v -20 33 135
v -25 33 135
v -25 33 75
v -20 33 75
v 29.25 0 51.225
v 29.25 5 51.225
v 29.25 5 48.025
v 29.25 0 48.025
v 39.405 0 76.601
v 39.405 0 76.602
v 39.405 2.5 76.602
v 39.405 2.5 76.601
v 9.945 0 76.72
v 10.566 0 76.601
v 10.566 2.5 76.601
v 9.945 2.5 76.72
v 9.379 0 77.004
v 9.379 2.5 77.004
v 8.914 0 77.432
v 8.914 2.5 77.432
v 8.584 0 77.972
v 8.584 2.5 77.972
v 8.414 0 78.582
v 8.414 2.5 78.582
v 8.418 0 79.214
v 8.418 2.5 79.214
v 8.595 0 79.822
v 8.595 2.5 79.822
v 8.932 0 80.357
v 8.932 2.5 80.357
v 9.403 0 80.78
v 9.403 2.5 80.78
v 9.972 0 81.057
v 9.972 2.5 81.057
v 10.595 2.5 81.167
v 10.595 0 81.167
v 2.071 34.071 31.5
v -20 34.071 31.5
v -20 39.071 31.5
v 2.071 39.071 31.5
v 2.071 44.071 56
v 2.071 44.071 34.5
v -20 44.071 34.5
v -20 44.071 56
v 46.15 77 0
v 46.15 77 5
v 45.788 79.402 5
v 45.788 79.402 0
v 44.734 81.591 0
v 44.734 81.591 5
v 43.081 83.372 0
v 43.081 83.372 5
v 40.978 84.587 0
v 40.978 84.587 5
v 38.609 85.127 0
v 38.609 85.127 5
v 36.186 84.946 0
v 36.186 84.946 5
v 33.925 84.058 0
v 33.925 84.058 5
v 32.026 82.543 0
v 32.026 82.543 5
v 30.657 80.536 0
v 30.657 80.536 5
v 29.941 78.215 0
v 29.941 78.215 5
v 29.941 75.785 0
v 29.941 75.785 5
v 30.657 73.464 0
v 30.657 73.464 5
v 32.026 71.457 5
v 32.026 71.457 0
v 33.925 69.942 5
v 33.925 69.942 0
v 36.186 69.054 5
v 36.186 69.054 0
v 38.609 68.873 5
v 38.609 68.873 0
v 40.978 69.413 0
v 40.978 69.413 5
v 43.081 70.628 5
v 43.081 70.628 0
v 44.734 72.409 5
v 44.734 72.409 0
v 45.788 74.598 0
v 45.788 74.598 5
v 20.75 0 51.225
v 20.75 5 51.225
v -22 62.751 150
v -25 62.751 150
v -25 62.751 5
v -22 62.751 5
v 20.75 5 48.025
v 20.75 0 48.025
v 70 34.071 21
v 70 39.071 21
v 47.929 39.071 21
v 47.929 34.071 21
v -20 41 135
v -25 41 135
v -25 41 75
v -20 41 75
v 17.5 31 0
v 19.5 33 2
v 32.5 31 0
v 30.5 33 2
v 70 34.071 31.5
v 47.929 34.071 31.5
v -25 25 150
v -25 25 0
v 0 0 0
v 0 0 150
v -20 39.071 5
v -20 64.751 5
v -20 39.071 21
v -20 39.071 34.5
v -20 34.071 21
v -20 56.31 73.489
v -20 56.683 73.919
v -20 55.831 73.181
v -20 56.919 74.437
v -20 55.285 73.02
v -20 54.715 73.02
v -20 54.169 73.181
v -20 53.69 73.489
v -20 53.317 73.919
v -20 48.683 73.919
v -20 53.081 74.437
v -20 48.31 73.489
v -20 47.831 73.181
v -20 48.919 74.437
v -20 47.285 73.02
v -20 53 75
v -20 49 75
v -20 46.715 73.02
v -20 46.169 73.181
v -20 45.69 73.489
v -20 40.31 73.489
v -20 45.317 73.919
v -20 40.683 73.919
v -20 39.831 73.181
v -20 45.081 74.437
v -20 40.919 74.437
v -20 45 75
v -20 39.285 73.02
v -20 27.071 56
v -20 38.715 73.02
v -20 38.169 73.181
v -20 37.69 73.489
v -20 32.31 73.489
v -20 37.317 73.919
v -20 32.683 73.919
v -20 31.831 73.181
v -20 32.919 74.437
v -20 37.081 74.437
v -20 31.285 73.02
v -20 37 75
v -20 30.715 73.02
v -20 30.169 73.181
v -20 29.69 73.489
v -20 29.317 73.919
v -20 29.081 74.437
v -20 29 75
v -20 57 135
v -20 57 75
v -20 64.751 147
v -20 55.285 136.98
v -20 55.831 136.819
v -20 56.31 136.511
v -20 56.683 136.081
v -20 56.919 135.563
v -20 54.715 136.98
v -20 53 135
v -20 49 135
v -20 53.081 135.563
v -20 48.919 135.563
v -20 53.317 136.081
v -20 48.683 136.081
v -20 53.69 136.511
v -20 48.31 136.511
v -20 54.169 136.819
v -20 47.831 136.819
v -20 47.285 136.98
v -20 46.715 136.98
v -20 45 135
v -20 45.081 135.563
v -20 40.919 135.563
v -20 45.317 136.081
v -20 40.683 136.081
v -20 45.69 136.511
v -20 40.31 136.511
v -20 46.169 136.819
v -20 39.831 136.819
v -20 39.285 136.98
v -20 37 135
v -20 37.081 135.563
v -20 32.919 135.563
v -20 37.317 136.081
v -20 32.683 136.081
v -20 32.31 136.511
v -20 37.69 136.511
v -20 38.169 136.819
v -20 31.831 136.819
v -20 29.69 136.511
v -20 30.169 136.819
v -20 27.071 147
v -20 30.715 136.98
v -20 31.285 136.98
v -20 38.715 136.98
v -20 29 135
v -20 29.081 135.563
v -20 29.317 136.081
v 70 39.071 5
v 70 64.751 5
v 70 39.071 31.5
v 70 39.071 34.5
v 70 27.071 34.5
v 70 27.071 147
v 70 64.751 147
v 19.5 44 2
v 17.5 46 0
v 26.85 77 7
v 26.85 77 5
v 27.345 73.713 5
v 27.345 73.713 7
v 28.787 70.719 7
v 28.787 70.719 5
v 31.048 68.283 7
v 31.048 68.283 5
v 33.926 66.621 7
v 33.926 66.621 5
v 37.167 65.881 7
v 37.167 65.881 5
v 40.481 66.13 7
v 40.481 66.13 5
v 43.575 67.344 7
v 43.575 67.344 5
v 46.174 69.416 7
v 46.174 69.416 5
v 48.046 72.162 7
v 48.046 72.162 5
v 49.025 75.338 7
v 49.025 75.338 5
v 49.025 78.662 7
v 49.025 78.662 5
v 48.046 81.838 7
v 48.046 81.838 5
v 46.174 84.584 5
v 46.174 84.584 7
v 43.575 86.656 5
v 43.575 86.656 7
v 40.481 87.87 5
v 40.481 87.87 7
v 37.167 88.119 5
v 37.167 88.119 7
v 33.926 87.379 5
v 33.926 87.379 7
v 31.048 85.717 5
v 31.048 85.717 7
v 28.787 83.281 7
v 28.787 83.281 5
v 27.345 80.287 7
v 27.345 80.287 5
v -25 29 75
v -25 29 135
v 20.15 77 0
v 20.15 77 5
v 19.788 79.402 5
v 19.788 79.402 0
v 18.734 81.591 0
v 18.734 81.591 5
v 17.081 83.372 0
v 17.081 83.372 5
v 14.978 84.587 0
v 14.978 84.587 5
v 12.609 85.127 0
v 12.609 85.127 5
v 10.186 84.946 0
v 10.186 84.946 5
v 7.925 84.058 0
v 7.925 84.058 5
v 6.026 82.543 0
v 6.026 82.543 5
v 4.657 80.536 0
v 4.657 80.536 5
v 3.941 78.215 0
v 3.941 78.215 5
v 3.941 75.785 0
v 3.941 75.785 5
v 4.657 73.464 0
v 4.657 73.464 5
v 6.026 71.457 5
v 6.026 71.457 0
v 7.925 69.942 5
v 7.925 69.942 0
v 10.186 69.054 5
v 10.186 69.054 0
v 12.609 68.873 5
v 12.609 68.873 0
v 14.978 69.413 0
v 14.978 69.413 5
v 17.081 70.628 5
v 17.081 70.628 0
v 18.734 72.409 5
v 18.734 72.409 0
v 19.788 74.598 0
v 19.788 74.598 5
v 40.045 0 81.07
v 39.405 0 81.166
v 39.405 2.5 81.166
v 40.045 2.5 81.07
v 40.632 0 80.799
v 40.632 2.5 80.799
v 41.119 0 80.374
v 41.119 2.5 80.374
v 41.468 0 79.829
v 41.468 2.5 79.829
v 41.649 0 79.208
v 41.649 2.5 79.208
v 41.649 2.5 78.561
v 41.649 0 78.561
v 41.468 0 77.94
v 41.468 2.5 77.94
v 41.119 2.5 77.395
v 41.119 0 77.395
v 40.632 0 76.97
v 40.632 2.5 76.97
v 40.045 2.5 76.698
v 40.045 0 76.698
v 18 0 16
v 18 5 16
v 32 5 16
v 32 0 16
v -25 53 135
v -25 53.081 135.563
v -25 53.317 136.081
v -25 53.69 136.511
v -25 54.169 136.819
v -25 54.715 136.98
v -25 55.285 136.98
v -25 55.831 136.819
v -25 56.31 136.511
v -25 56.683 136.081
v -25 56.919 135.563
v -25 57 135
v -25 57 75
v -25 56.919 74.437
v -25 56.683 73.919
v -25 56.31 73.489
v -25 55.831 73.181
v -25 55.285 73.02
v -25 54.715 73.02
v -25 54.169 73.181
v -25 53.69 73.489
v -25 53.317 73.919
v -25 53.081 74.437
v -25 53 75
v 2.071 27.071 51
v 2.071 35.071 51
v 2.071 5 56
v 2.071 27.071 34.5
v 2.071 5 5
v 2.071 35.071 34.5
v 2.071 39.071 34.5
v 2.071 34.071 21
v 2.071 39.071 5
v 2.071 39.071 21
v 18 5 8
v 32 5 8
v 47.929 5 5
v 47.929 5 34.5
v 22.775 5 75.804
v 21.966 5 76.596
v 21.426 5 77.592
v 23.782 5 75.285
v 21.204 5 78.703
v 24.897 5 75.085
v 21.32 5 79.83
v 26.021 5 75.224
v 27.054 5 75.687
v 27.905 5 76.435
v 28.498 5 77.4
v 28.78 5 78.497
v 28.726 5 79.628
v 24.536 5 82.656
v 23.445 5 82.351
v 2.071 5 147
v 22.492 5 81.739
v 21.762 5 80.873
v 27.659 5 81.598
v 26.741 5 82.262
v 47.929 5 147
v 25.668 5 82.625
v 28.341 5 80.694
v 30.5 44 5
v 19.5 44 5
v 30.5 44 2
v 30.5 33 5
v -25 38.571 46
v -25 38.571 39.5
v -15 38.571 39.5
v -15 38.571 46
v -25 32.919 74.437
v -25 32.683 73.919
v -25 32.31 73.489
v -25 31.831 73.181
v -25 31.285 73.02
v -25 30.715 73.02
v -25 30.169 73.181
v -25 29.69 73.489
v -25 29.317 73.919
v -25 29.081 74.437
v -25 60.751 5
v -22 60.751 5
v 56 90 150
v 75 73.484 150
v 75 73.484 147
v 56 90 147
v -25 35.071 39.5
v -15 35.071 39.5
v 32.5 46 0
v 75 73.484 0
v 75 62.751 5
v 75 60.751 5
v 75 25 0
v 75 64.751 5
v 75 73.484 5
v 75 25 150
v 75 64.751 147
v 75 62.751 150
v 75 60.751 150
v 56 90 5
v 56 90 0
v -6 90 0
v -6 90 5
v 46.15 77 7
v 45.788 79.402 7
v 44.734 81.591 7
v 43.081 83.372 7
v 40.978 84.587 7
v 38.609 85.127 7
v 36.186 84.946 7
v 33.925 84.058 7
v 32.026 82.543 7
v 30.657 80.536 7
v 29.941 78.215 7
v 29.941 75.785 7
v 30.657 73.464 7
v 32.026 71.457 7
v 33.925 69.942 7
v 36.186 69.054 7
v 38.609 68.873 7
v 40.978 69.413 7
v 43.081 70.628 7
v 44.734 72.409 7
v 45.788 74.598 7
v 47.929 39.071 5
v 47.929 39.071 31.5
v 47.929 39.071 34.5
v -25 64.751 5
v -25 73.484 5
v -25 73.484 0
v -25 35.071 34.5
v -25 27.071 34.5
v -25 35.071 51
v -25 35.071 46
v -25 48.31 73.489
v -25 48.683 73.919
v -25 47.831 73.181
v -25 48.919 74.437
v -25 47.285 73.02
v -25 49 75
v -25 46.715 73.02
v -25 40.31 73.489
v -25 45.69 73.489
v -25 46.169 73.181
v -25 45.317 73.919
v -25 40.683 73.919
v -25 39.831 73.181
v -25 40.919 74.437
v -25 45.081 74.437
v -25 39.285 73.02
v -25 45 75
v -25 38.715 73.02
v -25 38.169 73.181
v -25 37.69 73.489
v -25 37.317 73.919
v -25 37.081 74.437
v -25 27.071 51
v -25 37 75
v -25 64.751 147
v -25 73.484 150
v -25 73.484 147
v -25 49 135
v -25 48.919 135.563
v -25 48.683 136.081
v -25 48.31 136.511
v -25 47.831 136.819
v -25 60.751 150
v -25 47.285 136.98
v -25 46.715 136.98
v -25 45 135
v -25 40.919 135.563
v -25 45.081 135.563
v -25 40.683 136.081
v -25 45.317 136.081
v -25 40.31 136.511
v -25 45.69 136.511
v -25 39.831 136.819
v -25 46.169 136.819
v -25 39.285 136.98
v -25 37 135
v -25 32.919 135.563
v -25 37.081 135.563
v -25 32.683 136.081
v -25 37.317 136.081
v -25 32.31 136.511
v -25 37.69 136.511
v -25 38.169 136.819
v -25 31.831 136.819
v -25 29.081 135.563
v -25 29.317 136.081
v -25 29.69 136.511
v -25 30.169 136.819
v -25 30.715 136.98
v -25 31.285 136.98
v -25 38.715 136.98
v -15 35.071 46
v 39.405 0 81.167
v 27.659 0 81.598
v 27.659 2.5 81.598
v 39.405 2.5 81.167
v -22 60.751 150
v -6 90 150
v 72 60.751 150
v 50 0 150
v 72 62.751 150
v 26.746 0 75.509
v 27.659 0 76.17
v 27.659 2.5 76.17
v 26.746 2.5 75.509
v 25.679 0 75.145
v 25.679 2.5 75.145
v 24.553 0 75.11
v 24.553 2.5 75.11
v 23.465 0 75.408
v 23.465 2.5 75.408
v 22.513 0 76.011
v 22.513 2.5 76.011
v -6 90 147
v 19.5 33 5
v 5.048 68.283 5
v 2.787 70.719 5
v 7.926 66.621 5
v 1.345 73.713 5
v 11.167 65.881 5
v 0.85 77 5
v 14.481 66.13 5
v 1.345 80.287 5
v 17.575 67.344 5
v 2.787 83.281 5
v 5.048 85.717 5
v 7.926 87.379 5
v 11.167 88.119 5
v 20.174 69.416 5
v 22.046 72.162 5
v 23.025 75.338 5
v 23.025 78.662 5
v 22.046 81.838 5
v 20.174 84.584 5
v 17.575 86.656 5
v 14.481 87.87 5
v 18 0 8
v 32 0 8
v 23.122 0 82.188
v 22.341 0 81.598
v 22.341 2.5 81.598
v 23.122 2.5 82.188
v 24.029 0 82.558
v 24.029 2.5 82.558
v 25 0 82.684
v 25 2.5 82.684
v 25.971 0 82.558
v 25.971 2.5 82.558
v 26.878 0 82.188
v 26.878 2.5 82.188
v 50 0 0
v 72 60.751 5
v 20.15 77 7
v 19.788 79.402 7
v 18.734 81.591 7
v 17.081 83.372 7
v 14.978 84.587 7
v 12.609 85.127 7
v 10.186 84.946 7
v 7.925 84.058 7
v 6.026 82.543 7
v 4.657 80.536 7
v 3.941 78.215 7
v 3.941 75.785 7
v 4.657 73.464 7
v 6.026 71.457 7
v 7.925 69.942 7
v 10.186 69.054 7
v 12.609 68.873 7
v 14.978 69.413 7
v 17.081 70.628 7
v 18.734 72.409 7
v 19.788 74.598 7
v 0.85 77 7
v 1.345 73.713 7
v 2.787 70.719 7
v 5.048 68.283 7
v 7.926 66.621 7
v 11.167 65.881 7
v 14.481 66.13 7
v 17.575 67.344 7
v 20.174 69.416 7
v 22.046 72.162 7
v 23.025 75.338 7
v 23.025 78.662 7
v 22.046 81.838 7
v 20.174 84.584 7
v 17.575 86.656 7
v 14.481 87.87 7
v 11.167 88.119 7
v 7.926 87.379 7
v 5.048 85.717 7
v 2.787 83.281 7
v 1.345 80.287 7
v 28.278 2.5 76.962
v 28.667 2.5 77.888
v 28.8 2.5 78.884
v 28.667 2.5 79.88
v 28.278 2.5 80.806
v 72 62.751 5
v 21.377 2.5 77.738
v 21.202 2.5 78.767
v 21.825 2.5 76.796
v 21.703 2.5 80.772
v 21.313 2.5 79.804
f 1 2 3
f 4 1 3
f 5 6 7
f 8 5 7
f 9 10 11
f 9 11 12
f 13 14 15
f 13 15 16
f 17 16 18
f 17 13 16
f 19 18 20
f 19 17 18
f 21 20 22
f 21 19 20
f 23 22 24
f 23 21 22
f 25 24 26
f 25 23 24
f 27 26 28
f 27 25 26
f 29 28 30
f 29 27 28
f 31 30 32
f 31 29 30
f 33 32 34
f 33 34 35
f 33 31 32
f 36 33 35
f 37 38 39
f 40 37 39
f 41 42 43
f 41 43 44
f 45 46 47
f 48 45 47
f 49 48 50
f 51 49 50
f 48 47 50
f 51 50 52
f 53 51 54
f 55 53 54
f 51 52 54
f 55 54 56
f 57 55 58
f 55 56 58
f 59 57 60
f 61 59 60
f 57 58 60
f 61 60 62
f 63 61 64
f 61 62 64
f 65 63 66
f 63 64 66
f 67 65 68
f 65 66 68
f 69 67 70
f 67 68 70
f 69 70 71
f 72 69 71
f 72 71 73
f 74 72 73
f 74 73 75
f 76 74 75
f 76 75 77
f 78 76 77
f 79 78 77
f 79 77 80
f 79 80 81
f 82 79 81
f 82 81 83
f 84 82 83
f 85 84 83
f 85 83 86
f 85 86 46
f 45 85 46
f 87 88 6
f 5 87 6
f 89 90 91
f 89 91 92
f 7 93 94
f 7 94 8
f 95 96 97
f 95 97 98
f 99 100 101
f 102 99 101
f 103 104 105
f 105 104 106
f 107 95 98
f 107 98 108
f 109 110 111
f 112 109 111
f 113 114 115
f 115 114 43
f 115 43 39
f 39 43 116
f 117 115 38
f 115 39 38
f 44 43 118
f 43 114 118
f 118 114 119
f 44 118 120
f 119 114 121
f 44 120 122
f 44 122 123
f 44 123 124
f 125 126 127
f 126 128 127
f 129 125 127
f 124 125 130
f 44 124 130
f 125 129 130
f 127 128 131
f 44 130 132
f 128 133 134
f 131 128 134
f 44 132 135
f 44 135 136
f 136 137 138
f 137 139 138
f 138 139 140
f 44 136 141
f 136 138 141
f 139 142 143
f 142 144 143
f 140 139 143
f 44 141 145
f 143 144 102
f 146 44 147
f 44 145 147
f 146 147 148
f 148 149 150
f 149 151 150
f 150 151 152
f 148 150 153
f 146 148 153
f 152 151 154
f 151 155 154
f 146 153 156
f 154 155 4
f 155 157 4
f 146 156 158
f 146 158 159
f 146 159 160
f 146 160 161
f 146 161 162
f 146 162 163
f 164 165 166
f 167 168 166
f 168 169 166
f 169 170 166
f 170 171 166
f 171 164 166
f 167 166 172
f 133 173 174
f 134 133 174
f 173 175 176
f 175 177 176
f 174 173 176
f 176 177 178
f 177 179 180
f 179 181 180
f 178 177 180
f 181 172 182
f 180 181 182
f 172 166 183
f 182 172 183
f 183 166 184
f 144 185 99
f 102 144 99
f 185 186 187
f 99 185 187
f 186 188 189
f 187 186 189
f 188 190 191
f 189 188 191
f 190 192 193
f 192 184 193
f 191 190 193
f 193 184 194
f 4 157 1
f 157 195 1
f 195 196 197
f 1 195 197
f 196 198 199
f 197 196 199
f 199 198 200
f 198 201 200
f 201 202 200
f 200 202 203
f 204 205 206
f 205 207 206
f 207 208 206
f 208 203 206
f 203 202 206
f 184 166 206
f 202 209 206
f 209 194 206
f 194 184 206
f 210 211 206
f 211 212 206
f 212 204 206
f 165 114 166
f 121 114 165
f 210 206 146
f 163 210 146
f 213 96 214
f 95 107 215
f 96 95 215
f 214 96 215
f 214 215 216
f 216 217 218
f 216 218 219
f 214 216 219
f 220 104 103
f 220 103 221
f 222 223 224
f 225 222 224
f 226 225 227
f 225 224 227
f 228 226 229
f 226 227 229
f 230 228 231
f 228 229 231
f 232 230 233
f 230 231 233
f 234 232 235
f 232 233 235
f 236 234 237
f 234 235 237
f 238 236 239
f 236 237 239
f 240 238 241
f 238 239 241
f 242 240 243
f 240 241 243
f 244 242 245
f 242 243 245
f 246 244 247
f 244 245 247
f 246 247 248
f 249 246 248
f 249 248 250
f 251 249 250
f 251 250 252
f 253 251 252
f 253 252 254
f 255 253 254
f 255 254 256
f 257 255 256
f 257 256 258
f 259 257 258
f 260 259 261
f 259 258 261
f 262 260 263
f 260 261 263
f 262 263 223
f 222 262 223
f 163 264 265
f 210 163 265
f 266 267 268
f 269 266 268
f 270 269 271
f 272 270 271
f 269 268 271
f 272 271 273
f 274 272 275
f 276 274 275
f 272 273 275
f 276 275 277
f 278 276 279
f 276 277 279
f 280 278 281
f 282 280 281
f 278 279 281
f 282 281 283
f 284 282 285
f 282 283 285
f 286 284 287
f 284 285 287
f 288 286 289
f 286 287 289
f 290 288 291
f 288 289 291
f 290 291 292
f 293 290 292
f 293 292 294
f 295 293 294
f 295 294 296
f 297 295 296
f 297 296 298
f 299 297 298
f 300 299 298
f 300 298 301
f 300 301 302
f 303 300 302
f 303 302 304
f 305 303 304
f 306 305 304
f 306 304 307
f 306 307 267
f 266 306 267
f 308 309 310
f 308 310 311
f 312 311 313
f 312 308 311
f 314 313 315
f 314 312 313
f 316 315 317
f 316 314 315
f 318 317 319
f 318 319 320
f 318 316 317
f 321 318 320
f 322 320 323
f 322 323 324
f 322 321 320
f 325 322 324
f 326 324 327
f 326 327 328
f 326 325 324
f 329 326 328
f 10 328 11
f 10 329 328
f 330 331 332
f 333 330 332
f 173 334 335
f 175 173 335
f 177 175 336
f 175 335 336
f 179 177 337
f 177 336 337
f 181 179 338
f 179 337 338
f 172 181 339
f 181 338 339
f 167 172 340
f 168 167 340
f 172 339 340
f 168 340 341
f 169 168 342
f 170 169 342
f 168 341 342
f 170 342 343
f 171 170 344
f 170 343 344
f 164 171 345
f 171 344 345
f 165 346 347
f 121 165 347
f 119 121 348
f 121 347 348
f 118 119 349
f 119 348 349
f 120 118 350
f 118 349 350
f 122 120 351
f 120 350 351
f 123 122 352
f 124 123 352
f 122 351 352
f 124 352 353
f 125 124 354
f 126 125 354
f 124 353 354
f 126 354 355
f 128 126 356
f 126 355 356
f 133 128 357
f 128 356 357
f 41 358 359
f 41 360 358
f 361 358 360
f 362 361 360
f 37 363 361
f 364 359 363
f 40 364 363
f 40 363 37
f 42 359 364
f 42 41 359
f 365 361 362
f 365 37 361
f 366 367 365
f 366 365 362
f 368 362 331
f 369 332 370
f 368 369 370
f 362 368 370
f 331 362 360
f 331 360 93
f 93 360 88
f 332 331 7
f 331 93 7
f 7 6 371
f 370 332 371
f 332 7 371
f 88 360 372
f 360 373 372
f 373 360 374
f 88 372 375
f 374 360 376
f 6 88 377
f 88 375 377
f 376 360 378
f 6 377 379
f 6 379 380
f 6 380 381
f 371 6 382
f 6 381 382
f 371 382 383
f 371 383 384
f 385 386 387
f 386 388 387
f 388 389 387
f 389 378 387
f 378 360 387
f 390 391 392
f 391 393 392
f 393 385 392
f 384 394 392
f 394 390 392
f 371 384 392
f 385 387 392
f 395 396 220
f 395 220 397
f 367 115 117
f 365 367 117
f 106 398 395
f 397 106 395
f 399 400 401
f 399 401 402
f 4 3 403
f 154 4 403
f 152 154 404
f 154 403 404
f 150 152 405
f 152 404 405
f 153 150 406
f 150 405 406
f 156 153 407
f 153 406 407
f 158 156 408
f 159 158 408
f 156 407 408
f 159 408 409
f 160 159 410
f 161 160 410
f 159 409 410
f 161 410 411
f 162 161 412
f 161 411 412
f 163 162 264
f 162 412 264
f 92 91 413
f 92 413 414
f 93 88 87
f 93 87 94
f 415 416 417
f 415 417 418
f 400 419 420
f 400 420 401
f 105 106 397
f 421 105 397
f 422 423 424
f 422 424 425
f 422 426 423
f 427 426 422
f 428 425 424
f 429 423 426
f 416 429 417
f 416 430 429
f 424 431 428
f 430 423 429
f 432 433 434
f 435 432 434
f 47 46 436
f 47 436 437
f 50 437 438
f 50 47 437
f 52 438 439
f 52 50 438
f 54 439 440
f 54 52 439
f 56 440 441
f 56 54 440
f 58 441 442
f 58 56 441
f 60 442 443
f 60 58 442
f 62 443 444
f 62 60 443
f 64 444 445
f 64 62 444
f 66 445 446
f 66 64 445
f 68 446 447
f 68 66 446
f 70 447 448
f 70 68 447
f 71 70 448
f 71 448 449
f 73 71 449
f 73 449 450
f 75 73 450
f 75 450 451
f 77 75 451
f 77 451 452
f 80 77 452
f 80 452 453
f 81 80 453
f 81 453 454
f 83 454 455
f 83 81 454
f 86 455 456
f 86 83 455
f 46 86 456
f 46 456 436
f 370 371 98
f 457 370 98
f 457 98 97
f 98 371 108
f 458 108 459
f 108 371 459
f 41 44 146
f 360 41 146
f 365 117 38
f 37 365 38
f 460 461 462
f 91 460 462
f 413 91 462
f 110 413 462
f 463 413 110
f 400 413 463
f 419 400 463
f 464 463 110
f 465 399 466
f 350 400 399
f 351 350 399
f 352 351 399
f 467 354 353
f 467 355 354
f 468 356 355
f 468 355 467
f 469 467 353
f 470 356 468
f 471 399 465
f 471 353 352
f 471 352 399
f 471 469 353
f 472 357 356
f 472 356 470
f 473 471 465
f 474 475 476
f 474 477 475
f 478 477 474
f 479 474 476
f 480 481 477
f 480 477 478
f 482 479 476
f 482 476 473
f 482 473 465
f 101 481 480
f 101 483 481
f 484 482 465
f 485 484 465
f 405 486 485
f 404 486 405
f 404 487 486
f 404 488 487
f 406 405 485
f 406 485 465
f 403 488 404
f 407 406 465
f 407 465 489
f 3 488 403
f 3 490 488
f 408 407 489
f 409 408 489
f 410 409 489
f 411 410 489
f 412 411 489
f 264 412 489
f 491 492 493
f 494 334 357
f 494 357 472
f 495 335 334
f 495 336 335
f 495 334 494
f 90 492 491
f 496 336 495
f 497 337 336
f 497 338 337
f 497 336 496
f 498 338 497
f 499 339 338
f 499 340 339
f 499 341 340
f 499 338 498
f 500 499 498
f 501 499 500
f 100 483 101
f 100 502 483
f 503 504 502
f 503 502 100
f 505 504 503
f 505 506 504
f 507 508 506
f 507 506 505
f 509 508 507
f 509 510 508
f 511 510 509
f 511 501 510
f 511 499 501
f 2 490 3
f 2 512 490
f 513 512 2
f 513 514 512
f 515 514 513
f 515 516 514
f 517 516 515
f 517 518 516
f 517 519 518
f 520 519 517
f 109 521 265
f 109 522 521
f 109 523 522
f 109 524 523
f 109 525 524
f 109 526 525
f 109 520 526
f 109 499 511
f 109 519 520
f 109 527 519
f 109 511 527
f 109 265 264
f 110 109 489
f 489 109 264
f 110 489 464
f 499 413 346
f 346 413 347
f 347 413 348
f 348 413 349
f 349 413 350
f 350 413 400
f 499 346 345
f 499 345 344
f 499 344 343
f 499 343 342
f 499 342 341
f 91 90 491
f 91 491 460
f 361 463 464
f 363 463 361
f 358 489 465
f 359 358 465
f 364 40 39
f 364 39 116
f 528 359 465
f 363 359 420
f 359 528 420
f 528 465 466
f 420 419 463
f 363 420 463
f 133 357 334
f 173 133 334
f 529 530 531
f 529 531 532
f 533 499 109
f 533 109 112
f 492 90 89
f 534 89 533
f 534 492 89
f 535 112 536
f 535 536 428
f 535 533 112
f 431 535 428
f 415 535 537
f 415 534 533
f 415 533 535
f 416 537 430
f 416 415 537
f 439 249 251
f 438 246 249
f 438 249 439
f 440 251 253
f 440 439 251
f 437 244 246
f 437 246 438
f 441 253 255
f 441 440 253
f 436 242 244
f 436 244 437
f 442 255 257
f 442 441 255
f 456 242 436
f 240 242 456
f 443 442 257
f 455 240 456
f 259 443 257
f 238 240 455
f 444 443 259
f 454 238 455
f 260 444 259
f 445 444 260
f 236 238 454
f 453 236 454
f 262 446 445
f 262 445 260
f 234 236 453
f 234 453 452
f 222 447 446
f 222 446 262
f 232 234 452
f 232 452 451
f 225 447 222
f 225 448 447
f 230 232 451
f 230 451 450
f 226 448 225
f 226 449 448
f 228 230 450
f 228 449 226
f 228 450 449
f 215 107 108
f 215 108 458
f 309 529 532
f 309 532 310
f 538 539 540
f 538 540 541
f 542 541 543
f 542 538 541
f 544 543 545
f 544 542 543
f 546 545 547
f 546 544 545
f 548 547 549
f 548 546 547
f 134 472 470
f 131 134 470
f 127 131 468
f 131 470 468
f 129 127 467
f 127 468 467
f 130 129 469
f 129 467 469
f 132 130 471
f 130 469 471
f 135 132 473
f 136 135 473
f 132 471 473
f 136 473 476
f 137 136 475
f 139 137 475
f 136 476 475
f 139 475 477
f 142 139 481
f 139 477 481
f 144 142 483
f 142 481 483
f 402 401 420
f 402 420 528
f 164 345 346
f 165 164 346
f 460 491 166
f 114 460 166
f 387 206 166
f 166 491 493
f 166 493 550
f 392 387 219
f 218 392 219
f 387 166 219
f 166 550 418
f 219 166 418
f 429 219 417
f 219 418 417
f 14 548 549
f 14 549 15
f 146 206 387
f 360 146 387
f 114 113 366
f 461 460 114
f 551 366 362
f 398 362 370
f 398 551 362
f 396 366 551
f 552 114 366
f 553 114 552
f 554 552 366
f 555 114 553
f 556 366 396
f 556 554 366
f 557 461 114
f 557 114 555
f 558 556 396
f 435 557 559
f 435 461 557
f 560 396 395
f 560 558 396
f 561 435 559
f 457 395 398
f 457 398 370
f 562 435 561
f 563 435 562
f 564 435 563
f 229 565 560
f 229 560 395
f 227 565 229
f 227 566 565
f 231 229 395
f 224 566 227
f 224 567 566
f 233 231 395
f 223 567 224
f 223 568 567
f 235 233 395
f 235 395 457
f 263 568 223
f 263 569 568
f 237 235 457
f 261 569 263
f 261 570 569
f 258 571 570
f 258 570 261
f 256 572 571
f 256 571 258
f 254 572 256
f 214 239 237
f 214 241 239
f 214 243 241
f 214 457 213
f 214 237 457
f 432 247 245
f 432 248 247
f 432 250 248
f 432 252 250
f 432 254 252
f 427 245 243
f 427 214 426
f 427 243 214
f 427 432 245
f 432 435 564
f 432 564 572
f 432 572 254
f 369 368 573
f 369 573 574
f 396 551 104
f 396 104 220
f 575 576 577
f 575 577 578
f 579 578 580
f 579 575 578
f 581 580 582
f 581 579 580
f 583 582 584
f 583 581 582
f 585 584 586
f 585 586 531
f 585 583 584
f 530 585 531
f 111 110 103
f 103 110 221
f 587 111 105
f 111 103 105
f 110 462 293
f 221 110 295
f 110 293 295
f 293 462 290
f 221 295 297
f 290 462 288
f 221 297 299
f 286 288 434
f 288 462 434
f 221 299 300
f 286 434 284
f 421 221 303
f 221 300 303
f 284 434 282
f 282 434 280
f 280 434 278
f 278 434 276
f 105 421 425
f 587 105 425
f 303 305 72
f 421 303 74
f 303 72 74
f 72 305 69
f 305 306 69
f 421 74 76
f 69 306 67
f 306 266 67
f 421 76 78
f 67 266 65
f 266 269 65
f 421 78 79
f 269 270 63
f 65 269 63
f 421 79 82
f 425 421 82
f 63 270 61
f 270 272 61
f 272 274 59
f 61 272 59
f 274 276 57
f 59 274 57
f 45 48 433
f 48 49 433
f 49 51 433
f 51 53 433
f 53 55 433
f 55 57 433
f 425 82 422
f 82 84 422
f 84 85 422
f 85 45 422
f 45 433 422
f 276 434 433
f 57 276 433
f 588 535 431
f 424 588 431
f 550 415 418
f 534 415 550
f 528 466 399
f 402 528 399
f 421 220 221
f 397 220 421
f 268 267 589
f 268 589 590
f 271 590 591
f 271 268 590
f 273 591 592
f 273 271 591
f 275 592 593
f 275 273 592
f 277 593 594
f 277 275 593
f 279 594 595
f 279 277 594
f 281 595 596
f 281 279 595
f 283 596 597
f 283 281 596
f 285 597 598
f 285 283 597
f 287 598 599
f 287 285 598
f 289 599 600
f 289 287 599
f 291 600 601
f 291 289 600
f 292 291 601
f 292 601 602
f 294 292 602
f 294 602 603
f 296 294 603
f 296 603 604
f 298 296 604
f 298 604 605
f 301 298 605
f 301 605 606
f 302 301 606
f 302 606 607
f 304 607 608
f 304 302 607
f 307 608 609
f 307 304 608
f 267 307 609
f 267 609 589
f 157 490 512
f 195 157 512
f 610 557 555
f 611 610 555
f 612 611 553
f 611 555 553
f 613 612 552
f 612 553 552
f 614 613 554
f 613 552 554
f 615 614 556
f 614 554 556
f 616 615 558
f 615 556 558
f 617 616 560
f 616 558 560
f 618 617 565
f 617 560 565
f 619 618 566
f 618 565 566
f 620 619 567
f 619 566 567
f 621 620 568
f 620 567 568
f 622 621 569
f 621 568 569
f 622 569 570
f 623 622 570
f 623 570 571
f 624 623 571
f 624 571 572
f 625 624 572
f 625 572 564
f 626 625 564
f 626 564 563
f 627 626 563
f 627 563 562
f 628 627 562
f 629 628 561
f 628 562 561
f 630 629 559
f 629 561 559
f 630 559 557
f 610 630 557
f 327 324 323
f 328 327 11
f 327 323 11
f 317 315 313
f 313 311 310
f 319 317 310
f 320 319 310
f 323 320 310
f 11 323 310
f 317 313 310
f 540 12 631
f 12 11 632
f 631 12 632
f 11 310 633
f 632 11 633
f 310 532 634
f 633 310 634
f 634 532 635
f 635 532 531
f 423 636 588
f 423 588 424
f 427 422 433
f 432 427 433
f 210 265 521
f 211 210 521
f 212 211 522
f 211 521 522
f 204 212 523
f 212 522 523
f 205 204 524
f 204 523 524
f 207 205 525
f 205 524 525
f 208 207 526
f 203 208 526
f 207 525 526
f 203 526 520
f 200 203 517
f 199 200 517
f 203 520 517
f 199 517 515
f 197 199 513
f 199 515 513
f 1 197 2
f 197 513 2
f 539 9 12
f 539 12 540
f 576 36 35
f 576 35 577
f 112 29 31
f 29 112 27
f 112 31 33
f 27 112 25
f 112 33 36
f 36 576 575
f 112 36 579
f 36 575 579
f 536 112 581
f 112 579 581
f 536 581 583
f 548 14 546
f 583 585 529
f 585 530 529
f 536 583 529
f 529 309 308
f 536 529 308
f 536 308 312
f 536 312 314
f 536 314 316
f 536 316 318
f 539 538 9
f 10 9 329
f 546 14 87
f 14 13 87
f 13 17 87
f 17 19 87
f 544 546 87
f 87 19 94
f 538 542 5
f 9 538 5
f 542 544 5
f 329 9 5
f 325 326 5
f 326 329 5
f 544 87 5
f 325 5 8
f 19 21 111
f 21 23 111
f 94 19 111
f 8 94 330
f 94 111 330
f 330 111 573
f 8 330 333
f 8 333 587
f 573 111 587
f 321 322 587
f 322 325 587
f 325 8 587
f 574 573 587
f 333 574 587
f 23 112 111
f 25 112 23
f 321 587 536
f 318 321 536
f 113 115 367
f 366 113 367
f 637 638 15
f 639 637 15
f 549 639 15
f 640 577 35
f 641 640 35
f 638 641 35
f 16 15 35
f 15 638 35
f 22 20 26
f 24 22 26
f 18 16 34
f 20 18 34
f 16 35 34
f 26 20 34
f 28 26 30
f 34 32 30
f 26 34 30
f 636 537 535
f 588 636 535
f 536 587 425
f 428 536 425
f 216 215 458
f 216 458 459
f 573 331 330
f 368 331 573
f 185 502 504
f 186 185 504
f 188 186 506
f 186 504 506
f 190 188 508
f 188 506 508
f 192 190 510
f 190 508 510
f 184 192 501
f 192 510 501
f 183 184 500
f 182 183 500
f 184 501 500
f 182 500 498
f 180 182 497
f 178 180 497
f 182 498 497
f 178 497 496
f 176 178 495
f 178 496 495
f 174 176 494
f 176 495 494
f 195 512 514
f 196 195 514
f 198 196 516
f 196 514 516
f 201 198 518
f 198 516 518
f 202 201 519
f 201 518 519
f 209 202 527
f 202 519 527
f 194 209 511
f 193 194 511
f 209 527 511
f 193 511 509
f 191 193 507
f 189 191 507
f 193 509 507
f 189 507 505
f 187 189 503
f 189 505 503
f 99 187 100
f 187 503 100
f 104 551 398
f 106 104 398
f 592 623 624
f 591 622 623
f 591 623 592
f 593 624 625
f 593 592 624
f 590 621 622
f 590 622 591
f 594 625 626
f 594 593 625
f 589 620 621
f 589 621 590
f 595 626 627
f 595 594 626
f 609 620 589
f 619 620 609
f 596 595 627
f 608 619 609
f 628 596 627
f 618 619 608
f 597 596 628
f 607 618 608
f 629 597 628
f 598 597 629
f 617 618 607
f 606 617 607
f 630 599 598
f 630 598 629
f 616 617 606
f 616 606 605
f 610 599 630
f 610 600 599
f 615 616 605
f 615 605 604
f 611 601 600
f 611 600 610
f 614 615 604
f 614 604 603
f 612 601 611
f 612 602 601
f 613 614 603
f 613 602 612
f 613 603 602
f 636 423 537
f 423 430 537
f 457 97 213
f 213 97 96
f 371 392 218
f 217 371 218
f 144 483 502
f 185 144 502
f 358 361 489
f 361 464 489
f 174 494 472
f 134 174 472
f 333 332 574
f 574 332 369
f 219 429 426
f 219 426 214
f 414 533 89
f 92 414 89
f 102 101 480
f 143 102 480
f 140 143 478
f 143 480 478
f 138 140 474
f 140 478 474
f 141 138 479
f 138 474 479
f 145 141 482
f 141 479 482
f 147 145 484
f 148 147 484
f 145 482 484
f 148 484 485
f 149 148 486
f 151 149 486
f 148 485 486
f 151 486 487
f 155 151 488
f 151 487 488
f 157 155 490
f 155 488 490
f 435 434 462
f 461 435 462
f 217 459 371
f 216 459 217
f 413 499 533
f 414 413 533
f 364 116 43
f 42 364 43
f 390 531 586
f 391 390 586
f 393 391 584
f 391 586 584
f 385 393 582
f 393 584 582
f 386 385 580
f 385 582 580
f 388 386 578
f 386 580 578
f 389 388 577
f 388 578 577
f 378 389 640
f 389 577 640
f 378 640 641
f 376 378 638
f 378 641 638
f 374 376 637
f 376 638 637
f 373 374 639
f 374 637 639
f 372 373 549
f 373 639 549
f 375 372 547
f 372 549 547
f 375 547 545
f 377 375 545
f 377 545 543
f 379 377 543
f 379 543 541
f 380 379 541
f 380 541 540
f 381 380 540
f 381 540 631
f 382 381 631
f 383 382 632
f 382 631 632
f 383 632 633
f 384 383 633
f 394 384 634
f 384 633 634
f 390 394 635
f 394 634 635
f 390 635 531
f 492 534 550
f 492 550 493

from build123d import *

# Parameters (mm, degrees)
BOSS_EXTRUDE2_DEPTH  = 150
CUT_EXTRUDE2_DEPTH   = 145
CUT_EXTRUDE4_DEPTH   = 145
BOSS_EXTRUDE3_DEPTH  = 90
SKETCH10_W           = 14
SKETCH10_H           = 8
SKETCH10_W_2         = 8.5
SKETCH10_H_2         = 3.2
CUT_EXTRUDE5_DEPTH   = 189.01595677
SKETCH11_W           = 11
SKETCH11_H           = 11
CUT_EXTRUDE6_DEPTH   = 187.413518823
SKETCH12_R           = 11.15
SKETCH12_R_2         = 8.15
BOSS_EXTRUDE4_DEPTH  = 2
SKETCH13_R           = 8.15
CUT_EXTRUDE7_DEPTH   = 187.413518823
CHAMFER1_SIZE        = 2
CUT_EXTRUDE8_REACH   = 166.515
SKETCH14_W           = 45.857864376
SKETCH14_H           = 8
BOSS_EXTRUDE5_REACH  = 179.757
SKETCH15_W           = 22.071067812
SKETCH15_H           = 16.5
BOSS_EXTRUDE6_REACH  = 179.757
SKETCH16_W           = 22.071067812
SKETCH16_H           = 16.5
BOSS_EXTRUDE7_DEPTH  = 22.071067812
BOSS_EXTRUDE9_DEPTH  = 3
SKETCH19_W           = 1
SKETCH19_H           = 2
BOSS_EXTRUDE10_DEPTH = 142
CUT_EXTRUDE9_DEPTH   = 151.203195705
SKETCH21_W           = 16.5
SKETCH21_H           = 8
CUT_EXTRUDE10_DEPTH  = 200.060292374
SKETCH22_W           = 6.5
SKETCH22_H           = 3.5
CUT_EXTRUDE11_DEPTH  = 10
CUT_EXTRUDE13_DEPTH  = 5
CUT_EXTRUDE15_DEPTH  = 2.5
SKETCH28_R           = 3.8
CUT_EXTRUDE16_DEPTH  = 190.15932438
BOSS_EXTRUDE11_DEPTH = 13


with BuildPart() as part:
    # Sketch1 → Boss-Extrude2 (new body)
    with BuildSketch(Plane.XY):
        Polygon((0, 0), (50, 0), (75, 25), (75, 73.483551981), (56, 90), (-6, 90), (-25, 73.483551981), (-25, 25), align=None)
    extrude(amount=BOSS_EXTRUDE2_DEPTH)

    # Sketch3 → Cut-Extrude2 (cut)
    with BuildSketch(Plane.XY.offset(150)):
        Polygon((-4.130576603, 85), (-20, 71.204920704), (-20, 27.071067812), (2.071067812, 5), (47.928932188, 5), (70, 27.071067812), (70, 71.204920704), (54.130576603, 85), align=None)
    extrude(amount=-CUT_EXTRUDE2_DEPTH, mode=Mode.SUBTRACT)

    # Sketch8 → Cut-Extrude4 (cut)
    with BuildSketch(Plane.XY.offset(150)):
        Polygon((-6, 90), (-25, 73.483551981), (-25, 60.75095761), (-22, 60.75095761), (-22, 62.75095761), (-24, 62.75095761), (-24, 64.75095761), (-20, 64.75095761), (-20, 71.204920704), (-4.130576603, 85), (54.130576603, 85), (70, 71.204920704), (70, 64.75095761), (74, 64.75095761), (74, 62.75095761), (72, 62.75095761), (72, 60.75095761), (75, 60.75095761), (75, 73.483551981), (56, 90), align=None)
    extrude(amount=-CUT_EXTRUDE4_DEPTH, mode=Mode.SUBTRACT)

    # Sketch9 → Boss-Extrude3 (add)
    with BuildSketch(Plane.ZY.offset(-70)):
        Polygon((21, 34.071067812), (31.5, 34.071067812), (31.5, 39.071067812), (34.5, 39.071067812), (34.5, 31.071067812), (18, 31.071067812), (18, 39.071067812), (21, 39.071067812), align=None)
    extrude(amount=BOSS_EXTRUDE3_DEPTH)

    # Sketch10 → Cut-Extrude5 (cut, through all)
    with BuildSketch(Plane(origin=(0, 5, 0), x_dir=(1, 0, 0), z_dir=(0, 1, 0))):
        with Locations((25, -12)):
            Rectangle(SKETCH10_W, SKETCH10_H)
        with Locations((25, -49.625084235)):
            Rectangle(SKETCH10_W_2, SKETCH10_H_2)
    extrude(amount=-CUT_EXTRUDE5_DEPTH, mode=Mode.SUBTRACT)

    # Sketch11 → Cut-Extrude6 (cut, through all)
    with BuildSketch(Plane.XY.offset(5)):
        with Locations((25, 38.5)):
            Rectangle(SKETCH11_W, SKETCH11_H)
    extrude(amount=-CUT_EXTRUDE6_DEPTH, mode=Mode.SUBTRACT)

    # Sketch12 → Boss-Extrude4 (add)
    # profile 1 of 2: a face of its own
    with BuildSketch(Plane.XY.offset(5)):
        with Locations(Location((12, 77, 0), (0, 0, 180))):
            Circle(SKETCH12_R)
        with Locations((12, 77)):
            Circle(SKETCH12_R_2, mode=Mode.SUBTRACT)
    # profile 2 of 2: a face of its own
    with BuildSketch(Plane.XY.offset(5)):
        with Locations(Location((38, 77, 0), (0, 0, 180))):
            Circle(SKETCH12_R)
        with Locations((38, 77)):
            Circle(SKETCH12_R_2, mode=Mode.SUBTRACT)
    extrude(amount=BOSS_EXTRUDE4_DEPTH)

    # Sketch13 → Cut-Extrude7 (cut, through all)
    with BuildSketch(Plane.XY.offset(5)):
        with Locations((12, 77)):
            Circle(SKETCH13_R)
        with Locations((38, 77)):
            Circle(SKETCH13_R)
    extrude(amount=-CUT_EXTRUDE7_DEPTH, mode=Mode.SUBTRACT)

    # Chamfer1
    chamfer1_edges = [part.edges().sort_by_distance(p)[0] for p in [
        (19.5, 38.5, 0),
        (25, 44, 0),
        (30.5, 38.5, 0),
        (25, 33, 0),
    ]]
    chamfer(chamfer1_edges, length=CHAMFER1_SIZE)

    # Cut-Extrude8: up to this face of the body (flat: up to its plane)
    cut_extrude8_end = Plane(part.part.faces().sort_by_distance((25, 35.071067812, 18))[0])
    # Sketch14 → Cut-Extrude8 (cut, up to the picked face)
    with BuildSketch(Plane.XY.offset(34.5), mode=Mode.PRIVATE) as cut_extrude8_sk1:
        with Locations((25, 35.071067812)):
            Rectangle(SKETCH14_W, SKETCH14_H)
    cut_extrude8_tool1 = split(extrude(cut_extrude8_sk1.sketch, amount=-CUT_EXTRUDE8_REACH, mode=Mode.PRIVATE), bisect_by=cut_extrude8_end, keep=Keep.BOTH, mode=Mode.PRIVATE)
    add(cut_extrude8_tool1.solids().sort_by(Axis((25, 35.071068, 34.5), (0, 0, -1)))[0], mode=Mode.SUBTRACT)

    # Boss-Extrude5: up to this plane
    boss_extrude5_end = Plane(origin=(47.928932188, 5, -120.415945788), z_dir=(0.7071067811865476, -0.7071067811865475, 0))
    # Sketch15 → Boss-Extrude5 (add, up to the surface)
    with BuildSketch(Plane.XZ.offset(-31.071067812), mode=Mode.PRIVATE) as boss_extrude5_sk1:
        with Locations((58.964466094, 26.25)):
            Rectangle(SKETCH15_W, SKETCH15_H)
    boss_extrude5_tool1 = split(extrude(boss_extrude5_sk1.sketch, amount=BOSS_EXTRUDE5_REACH, mode=Mode.PRIVATE), bisect_by=boss_extrude5_end, keep=Keep.BOTH, mode=Mode.PRIVATE)
    add(boss_extrude5_tool1.solids().sort_by_distance((58.964466, 31.071068, 26.25))[0])

    # Boss-Extrude6: up to this plane
    boss_extrude6_end = Plane(origin=(-20, 27.071067812, -120.415945788), z_dir=(-0.7071067811865475, -0.7071067811865476, 0))
    # Sketch16 → Boss-Extrude6 (add, up to the surface)
    with BuildSketch(Plane.XZ.offset(-31.071067812), mode=Mode.PRIVATE) as boss_extrude6_sk1:
        with Locations((-8.964466094, 26.25)):
            Rectangle(SKETCH16_W, SKETCH16_H)
    boss_extrude6_tool1 = split(extrude(boss_extrude6_sk1.sketch, amount=BOSS_EXTRUDE6_REACH, mode=Mode.PRIVATE), bisect_by=boss_extrude6_end, keep=Keep.BOTH, mode=Mode.PRIVATE)
    add(boss_extrude6_tool1.solids().sort_by_distance((-8.964466, 31.071068, 26.25))[0])

    # Sketch17 → Boss-Extrude7 (add)
    with BuildSketch(Plane(origin=(-20, 0, 0), x_dir=(0, 0, -1), z_dir=(1, 0, 0))):
        Polygon((-56, 27.071067812), (-51, 27.071067812), (-51, 35.071067812), (-34.5, 35.071067812), (-34.5, 39.071067812), (-34.5, 44.071067812), (-56, 44.071067812), align=None)
        Polygon((-34.5, 5), (-34.5, 27.071067812), (-51, 27.071067812), (-56, 27.071067812), (-56, 5), align=None)
    extrude(amount=BOSS_EXTRUDE7_DEPTH)

    # Sketch18 → Boss-Extrude9 (add)
    with BuildSketch(Plane.XY.offset(150)):
        Polygon((75, 62.75095761), (75, 73.483551981), (56, 90), (-6, 90), (-25, 73.483551981), (-25, 62.75095761), (-24, 62.75095761), (-24, 64.75095761), (-20, 64.75095761), (-20, 27.071067812), (2.071067812, 5), (47.928932188, 5), (70, 27.071067812), (70, 64.75095761), (74, 64.75095761), (74, 62.75095761), align=None)
    extrude(amount=-BOSS_EXTRUDE9_DEPTH)

    # Sketch19 → Boss-Extrude10 (add)
    with BuildSketch(Plane(origin=(0, 0, 147), x_dir=(-1, 0, 0), z_dir=(0, 0, -1))):
        with Locations((-74.5, 63.75095761)):
            Rectangle(SKETCH19_W, SKETCH19_H)
        with Locations((24.5, 63.75095761)):
            Rectangle(SKETCH19_W, SKETCH19_H)
    extrude(amount=BOSS_EXTRUDE10_DEPTH)

    # Sketch20 → Cut-Extrude9 (cut, through all)
    with BuildSketch(Plane.XY.offset(56)):
        Polygon((-5, 5), (-20, 20), (-20, 5), align=None)
    extrude(amount=-CUT_EXTRUDE9_DEPTH, mode=Mode.SUBTRACT)

    # Sketch21 → Cut-Extrude10 (cut, through all)
    with BuildSketch(Plane(origin=(-20, 0, 0), x_dir=(0, 0, -1), z_dir=(1, 0, 0))):
        with Locations((-42.75, 31.071067812)):
            Rectangle(SKETCH21_W, SKETCH21_H)
    extrude(amount=-CUT_EXTRUDE10_DEPTH, mode=Mode.SUBTRACT)

    # Sketch22 → Cut-Extrude11 (cut)
    with BuildSketch(Plane.ZY.offset(25)):
        with Locations((42.75, 36.821067812)):
            Rectangle(SKETCH22_W, SKETCH22_H)
    extrude(amount=-CUT_EXTRUDE11_DEPTH, mode=Mode.SUBTRACT)

    # Sketch23 → Cut-Extrude13 (cut)
    with BuildSketch(Plane.ZY.offset(25)):
        with BuildLine():
            Line((75, 29), (135, 29))
            ThreePointArc((135, 29), (137, 31), (135, 33))
            Line((135, 33), (75, 33))
            ThreePointArc((75, 33), (73, 31), (75, 29))
        make_face()
        with BuildLine():
            Line((135, 41), (75, 41))
            ThreePointArc((75, 41), (73, 39), (75, 37))
            Line((75, 37), (135, 37))
            ThreePointArc((135, 37), (137, 39), (135, 41))
        make_face()
        with BuildLine():
            Line((135, 49), (75, 49))
            ThreePointArc((75, 49), (73, 47), (75, 45))
            Line((75, 45), (135, 45))
            ThreePointArc((135, 45), (137, 47), (135, 49))
        make_face()
        with BuildLine():
            Line((135, 57), (75, 57))
            ThreePointArc((75, 57), (73, 55), (75, 53))
            Line((75, 53), (135, 53))
            ThreePointArc((135, 53), (137, 55), (135, 57))
        make_face()
    extrude(amount=-CUT_EXTRUDE13_DEPTH, mode=Mode.SUBTRACT)

    # Sketch27 → Cut-Extrude15 (cut)
    with BuildSketch(Plane.XZ):
        with BuildLine():
            Line((39.404762454, 81.167250077), (39.404762454, 81.166207685))
            ThreePointArc((39.404762454, 81.166207685), (41.672056129, 78.884218387), (39.404762454, 76.60222909))
            Line((39.404762454, 76.60222909), (39.404762454, 76.601183426))
            Line((39.404762454, 76.601183426), (27.659446006, 76.169652537))
            ThreePointArc((27.659446006, 76.169652537), (25.117179913, 75.085745409), (22.512932044, 76.010874907))
            Line((22.512932044, 76.010874907), (10.566254086, 76.601183426))
            ThreePointArc((10.566254086, 76.601183426), (8.393884355, 78.898098023), (10.595237546, 81.167250077))
            Line((10.595237546, 81.167250077), (22.340553994, 81.598223966))
            ThreePointArc((22.340553994, 81.598223966), (25, 82.683938251), (27.659446006, 81.598223966))
            Line((27.659446006, 81.598223966), (39.404762454, 81.167250077))
        make_face()
    extrude(amount=-CUT_EXTRUDE15_DEPTH, mode=Mode.SUBTRACT)

    # Sketch28 → Cut-Extrude16 (cut, through all)
    with BuildSketch(Plane.XZ.offset(-2.5)):
        with Locations(Location((25, 78.883938251, 0), (0, 0, 45.584691403))):
            Circle(SKETCH28_R)
    extrude(amount=-CUT_EXTRUDE16_DEPTH, mode=Mode.SUBTRACT)

    # Sketch29 → Boss-Extrude11 (add)
    with BuildSketch(Plane(origin=(0, 0, 18), x_dir=(-1, 0, 0), z_dir=(0, 0, -1))):
        Polygon((-70, 39.071067812), (-70, 27.071067812), (-47.928932188, 5), (-47.928932188, 39.071067812), align=None)
        Polygon((20, 39.071067812), (-2.071067812, 39.071067812), (-2.071067812, 5), (20, 27.071067812), align=None)
    extrude(amount=BOSS_EXTRUDE11_DEPTH)


solid = part.part
